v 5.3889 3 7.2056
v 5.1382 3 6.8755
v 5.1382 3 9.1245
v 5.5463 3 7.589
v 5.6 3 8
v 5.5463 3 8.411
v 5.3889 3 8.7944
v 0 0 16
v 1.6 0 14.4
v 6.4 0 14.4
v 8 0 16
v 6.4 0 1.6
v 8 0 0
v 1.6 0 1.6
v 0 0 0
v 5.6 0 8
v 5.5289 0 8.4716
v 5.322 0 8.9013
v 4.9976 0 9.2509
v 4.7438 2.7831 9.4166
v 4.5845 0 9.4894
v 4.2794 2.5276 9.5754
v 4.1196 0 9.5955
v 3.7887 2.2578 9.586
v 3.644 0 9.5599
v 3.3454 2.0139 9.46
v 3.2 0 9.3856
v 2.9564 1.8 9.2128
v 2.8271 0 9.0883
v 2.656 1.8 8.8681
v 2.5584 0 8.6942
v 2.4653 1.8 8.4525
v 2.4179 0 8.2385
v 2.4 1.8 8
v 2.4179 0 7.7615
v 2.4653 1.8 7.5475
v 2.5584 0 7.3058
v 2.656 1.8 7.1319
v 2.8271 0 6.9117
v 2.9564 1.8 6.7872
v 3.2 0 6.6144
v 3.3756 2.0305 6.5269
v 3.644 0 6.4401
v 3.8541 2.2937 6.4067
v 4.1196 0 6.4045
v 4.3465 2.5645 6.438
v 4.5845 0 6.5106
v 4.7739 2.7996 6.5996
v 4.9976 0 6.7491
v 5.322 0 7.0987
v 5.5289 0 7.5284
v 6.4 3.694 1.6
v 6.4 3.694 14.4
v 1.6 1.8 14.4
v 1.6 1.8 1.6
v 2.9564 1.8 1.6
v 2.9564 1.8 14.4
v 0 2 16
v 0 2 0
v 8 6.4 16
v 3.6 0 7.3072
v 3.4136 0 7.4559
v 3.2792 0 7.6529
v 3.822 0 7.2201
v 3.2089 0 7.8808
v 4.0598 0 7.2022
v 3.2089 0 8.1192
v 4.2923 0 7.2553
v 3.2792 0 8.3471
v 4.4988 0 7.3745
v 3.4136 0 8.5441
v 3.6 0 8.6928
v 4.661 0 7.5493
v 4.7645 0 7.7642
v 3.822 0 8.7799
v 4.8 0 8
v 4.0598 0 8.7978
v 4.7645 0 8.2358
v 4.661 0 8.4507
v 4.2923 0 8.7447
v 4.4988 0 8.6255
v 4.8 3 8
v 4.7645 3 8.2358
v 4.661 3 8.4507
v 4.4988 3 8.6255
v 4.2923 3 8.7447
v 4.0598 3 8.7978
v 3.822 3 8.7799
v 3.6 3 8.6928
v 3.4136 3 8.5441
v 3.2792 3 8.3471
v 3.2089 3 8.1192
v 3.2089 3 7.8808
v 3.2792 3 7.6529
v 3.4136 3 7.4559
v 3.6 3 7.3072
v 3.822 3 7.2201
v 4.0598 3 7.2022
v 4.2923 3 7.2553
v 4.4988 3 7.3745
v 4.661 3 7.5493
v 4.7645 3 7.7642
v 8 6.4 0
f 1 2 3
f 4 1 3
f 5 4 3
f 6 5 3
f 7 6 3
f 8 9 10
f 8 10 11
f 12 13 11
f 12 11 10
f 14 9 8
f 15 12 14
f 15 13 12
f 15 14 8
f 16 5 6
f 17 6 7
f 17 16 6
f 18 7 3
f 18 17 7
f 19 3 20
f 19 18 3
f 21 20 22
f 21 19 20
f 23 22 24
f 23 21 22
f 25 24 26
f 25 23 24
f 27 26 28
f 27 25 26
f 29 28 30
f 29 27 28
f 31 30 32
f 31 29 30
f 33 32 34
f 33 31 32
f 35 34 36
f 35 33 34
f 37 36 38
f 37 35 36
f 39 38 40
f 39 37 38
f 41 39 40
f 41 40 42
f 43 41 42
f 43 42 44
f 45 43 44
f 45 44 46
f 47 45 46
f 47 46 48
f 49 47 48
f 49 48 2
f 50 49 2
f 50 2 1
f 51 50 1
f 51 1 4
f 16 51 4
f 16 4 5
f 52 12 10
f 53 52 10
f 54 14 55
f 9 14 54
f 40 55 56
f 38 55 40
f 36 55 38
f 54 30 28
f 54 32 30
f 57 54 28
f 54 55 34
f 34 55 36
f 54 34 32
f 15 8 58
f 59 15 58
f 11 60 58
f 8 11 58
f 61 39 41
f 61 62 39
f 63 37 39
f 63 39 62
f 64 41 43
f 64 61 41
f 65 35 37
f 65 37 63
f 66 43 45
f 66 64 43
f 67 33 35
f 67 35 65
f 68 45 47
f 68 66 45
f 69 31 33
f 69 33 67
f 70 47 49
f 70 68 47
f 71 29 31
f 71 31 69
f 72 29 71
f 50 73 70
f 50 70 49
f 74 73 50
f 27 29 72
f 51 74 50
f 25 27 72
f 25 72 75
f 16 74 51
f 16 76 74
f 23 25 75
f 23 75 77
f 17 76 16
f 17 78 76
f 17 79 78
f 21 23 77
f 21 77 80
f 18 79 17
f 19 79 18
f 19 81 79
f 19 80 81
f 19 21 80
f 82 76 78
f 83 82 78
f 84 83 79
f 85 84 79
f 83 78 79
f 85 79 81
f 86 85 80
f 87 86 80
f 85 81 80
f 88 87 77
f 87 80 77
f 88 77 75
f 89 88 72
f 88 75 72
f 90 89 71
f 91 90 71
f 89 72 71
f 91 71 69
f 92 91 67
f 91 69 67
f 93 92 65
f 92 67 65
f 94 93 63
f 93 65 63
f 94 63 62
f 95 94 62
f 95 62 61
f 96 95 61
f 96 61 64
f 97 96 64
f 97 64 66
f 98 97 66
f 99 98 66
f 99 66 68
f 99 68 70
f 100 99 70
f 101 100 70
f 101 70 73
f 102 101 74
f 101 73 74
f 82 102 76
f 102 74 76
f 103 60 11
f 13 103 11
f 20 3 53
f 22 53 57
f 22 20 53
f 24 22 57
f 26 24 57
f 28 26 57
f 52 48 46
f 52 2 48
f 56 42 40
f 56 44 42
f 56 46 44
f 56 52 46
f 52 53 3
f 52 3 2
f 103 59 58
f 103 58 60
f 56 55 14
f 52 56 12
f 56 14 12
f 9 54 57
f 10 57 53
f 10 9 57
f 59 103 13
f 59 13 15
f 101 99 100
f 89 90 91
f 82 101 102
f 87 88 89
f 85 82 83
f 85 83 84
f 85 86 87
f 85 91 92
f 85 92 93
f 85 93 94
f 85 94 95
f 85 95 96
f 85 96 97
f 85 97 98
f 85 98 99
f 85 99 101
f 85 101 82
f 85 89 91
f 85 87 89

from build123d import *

# Parameters (mm, degrees)
BOSS_EXTRUDE1_DEPTH = 16
SKETCH4_W           = 4.8
SKETCH4_H           = 12.8
CUT_EXTRUDE2_DEPTH  = 1.8
SHELL1_START        = 1.6
SHELL1_DEPTH        = 12.8
SKETCH2_R           = 1.6
BOSS_EXTRUDE2_DEPTH = 3
SKETCH3_R           = 0.8
CUT_EXTRUDE1_DEPTH  = 3


# Read off the part's stored shape, not the designer's step: Shell1
with BuildPart() as part:
    # Sketch1 → Boss-Extrude1 (new body)
    with BuildSketch(Plane.XY):
        Polygon((0, 0), (0, 2), (8, 6.4), (8, 0), align=None)
    extrude(amount=BOSS_EXTRUDE1_DEPTH)

    # Sketch4 → Cut-Extrude2 (cut)
    with BuildSketch(Plane.XZ):
        with Locations((4, 8)):
            Rectangle(SKETCH4_W, SKETCH4_H)
    extrude(amount=-CUT_EXTRUDE2_DEPTH, mode=Mode.SUBTRACT)

    # Shell1 outline → Shell1 (cut)
    with BuildSketch(Plane.XY.offset(SHELL1_START)):
        Polygon((2.95642537, 1.8), (6.4, 1.8), (6.4, 3.693966046), align=None)
    extrude(amount=SHELL1_DEPTH, mode=Mode.SUBTRACT)

    # Sketch2 → Boss-Extrude2 (add)
    with BuildSketch(Plane.XZ):
        with Locations((4, 8)):
            Circle(SKETCH2_R)
    extrude(amount=-BOSS_EXTRUDE2_DEPTH)

    # Sketch3 → Cut-Extrude1 (cut)
    with BuildSketch(Plane.XZ):
        with Locations((4, 8)):
            Circle(SKETCH3_R)
    extrude(amount=-CUT_EXTRUDE1_DEPTH, mode=Mode.SUBTRACT)


solid = part.part
